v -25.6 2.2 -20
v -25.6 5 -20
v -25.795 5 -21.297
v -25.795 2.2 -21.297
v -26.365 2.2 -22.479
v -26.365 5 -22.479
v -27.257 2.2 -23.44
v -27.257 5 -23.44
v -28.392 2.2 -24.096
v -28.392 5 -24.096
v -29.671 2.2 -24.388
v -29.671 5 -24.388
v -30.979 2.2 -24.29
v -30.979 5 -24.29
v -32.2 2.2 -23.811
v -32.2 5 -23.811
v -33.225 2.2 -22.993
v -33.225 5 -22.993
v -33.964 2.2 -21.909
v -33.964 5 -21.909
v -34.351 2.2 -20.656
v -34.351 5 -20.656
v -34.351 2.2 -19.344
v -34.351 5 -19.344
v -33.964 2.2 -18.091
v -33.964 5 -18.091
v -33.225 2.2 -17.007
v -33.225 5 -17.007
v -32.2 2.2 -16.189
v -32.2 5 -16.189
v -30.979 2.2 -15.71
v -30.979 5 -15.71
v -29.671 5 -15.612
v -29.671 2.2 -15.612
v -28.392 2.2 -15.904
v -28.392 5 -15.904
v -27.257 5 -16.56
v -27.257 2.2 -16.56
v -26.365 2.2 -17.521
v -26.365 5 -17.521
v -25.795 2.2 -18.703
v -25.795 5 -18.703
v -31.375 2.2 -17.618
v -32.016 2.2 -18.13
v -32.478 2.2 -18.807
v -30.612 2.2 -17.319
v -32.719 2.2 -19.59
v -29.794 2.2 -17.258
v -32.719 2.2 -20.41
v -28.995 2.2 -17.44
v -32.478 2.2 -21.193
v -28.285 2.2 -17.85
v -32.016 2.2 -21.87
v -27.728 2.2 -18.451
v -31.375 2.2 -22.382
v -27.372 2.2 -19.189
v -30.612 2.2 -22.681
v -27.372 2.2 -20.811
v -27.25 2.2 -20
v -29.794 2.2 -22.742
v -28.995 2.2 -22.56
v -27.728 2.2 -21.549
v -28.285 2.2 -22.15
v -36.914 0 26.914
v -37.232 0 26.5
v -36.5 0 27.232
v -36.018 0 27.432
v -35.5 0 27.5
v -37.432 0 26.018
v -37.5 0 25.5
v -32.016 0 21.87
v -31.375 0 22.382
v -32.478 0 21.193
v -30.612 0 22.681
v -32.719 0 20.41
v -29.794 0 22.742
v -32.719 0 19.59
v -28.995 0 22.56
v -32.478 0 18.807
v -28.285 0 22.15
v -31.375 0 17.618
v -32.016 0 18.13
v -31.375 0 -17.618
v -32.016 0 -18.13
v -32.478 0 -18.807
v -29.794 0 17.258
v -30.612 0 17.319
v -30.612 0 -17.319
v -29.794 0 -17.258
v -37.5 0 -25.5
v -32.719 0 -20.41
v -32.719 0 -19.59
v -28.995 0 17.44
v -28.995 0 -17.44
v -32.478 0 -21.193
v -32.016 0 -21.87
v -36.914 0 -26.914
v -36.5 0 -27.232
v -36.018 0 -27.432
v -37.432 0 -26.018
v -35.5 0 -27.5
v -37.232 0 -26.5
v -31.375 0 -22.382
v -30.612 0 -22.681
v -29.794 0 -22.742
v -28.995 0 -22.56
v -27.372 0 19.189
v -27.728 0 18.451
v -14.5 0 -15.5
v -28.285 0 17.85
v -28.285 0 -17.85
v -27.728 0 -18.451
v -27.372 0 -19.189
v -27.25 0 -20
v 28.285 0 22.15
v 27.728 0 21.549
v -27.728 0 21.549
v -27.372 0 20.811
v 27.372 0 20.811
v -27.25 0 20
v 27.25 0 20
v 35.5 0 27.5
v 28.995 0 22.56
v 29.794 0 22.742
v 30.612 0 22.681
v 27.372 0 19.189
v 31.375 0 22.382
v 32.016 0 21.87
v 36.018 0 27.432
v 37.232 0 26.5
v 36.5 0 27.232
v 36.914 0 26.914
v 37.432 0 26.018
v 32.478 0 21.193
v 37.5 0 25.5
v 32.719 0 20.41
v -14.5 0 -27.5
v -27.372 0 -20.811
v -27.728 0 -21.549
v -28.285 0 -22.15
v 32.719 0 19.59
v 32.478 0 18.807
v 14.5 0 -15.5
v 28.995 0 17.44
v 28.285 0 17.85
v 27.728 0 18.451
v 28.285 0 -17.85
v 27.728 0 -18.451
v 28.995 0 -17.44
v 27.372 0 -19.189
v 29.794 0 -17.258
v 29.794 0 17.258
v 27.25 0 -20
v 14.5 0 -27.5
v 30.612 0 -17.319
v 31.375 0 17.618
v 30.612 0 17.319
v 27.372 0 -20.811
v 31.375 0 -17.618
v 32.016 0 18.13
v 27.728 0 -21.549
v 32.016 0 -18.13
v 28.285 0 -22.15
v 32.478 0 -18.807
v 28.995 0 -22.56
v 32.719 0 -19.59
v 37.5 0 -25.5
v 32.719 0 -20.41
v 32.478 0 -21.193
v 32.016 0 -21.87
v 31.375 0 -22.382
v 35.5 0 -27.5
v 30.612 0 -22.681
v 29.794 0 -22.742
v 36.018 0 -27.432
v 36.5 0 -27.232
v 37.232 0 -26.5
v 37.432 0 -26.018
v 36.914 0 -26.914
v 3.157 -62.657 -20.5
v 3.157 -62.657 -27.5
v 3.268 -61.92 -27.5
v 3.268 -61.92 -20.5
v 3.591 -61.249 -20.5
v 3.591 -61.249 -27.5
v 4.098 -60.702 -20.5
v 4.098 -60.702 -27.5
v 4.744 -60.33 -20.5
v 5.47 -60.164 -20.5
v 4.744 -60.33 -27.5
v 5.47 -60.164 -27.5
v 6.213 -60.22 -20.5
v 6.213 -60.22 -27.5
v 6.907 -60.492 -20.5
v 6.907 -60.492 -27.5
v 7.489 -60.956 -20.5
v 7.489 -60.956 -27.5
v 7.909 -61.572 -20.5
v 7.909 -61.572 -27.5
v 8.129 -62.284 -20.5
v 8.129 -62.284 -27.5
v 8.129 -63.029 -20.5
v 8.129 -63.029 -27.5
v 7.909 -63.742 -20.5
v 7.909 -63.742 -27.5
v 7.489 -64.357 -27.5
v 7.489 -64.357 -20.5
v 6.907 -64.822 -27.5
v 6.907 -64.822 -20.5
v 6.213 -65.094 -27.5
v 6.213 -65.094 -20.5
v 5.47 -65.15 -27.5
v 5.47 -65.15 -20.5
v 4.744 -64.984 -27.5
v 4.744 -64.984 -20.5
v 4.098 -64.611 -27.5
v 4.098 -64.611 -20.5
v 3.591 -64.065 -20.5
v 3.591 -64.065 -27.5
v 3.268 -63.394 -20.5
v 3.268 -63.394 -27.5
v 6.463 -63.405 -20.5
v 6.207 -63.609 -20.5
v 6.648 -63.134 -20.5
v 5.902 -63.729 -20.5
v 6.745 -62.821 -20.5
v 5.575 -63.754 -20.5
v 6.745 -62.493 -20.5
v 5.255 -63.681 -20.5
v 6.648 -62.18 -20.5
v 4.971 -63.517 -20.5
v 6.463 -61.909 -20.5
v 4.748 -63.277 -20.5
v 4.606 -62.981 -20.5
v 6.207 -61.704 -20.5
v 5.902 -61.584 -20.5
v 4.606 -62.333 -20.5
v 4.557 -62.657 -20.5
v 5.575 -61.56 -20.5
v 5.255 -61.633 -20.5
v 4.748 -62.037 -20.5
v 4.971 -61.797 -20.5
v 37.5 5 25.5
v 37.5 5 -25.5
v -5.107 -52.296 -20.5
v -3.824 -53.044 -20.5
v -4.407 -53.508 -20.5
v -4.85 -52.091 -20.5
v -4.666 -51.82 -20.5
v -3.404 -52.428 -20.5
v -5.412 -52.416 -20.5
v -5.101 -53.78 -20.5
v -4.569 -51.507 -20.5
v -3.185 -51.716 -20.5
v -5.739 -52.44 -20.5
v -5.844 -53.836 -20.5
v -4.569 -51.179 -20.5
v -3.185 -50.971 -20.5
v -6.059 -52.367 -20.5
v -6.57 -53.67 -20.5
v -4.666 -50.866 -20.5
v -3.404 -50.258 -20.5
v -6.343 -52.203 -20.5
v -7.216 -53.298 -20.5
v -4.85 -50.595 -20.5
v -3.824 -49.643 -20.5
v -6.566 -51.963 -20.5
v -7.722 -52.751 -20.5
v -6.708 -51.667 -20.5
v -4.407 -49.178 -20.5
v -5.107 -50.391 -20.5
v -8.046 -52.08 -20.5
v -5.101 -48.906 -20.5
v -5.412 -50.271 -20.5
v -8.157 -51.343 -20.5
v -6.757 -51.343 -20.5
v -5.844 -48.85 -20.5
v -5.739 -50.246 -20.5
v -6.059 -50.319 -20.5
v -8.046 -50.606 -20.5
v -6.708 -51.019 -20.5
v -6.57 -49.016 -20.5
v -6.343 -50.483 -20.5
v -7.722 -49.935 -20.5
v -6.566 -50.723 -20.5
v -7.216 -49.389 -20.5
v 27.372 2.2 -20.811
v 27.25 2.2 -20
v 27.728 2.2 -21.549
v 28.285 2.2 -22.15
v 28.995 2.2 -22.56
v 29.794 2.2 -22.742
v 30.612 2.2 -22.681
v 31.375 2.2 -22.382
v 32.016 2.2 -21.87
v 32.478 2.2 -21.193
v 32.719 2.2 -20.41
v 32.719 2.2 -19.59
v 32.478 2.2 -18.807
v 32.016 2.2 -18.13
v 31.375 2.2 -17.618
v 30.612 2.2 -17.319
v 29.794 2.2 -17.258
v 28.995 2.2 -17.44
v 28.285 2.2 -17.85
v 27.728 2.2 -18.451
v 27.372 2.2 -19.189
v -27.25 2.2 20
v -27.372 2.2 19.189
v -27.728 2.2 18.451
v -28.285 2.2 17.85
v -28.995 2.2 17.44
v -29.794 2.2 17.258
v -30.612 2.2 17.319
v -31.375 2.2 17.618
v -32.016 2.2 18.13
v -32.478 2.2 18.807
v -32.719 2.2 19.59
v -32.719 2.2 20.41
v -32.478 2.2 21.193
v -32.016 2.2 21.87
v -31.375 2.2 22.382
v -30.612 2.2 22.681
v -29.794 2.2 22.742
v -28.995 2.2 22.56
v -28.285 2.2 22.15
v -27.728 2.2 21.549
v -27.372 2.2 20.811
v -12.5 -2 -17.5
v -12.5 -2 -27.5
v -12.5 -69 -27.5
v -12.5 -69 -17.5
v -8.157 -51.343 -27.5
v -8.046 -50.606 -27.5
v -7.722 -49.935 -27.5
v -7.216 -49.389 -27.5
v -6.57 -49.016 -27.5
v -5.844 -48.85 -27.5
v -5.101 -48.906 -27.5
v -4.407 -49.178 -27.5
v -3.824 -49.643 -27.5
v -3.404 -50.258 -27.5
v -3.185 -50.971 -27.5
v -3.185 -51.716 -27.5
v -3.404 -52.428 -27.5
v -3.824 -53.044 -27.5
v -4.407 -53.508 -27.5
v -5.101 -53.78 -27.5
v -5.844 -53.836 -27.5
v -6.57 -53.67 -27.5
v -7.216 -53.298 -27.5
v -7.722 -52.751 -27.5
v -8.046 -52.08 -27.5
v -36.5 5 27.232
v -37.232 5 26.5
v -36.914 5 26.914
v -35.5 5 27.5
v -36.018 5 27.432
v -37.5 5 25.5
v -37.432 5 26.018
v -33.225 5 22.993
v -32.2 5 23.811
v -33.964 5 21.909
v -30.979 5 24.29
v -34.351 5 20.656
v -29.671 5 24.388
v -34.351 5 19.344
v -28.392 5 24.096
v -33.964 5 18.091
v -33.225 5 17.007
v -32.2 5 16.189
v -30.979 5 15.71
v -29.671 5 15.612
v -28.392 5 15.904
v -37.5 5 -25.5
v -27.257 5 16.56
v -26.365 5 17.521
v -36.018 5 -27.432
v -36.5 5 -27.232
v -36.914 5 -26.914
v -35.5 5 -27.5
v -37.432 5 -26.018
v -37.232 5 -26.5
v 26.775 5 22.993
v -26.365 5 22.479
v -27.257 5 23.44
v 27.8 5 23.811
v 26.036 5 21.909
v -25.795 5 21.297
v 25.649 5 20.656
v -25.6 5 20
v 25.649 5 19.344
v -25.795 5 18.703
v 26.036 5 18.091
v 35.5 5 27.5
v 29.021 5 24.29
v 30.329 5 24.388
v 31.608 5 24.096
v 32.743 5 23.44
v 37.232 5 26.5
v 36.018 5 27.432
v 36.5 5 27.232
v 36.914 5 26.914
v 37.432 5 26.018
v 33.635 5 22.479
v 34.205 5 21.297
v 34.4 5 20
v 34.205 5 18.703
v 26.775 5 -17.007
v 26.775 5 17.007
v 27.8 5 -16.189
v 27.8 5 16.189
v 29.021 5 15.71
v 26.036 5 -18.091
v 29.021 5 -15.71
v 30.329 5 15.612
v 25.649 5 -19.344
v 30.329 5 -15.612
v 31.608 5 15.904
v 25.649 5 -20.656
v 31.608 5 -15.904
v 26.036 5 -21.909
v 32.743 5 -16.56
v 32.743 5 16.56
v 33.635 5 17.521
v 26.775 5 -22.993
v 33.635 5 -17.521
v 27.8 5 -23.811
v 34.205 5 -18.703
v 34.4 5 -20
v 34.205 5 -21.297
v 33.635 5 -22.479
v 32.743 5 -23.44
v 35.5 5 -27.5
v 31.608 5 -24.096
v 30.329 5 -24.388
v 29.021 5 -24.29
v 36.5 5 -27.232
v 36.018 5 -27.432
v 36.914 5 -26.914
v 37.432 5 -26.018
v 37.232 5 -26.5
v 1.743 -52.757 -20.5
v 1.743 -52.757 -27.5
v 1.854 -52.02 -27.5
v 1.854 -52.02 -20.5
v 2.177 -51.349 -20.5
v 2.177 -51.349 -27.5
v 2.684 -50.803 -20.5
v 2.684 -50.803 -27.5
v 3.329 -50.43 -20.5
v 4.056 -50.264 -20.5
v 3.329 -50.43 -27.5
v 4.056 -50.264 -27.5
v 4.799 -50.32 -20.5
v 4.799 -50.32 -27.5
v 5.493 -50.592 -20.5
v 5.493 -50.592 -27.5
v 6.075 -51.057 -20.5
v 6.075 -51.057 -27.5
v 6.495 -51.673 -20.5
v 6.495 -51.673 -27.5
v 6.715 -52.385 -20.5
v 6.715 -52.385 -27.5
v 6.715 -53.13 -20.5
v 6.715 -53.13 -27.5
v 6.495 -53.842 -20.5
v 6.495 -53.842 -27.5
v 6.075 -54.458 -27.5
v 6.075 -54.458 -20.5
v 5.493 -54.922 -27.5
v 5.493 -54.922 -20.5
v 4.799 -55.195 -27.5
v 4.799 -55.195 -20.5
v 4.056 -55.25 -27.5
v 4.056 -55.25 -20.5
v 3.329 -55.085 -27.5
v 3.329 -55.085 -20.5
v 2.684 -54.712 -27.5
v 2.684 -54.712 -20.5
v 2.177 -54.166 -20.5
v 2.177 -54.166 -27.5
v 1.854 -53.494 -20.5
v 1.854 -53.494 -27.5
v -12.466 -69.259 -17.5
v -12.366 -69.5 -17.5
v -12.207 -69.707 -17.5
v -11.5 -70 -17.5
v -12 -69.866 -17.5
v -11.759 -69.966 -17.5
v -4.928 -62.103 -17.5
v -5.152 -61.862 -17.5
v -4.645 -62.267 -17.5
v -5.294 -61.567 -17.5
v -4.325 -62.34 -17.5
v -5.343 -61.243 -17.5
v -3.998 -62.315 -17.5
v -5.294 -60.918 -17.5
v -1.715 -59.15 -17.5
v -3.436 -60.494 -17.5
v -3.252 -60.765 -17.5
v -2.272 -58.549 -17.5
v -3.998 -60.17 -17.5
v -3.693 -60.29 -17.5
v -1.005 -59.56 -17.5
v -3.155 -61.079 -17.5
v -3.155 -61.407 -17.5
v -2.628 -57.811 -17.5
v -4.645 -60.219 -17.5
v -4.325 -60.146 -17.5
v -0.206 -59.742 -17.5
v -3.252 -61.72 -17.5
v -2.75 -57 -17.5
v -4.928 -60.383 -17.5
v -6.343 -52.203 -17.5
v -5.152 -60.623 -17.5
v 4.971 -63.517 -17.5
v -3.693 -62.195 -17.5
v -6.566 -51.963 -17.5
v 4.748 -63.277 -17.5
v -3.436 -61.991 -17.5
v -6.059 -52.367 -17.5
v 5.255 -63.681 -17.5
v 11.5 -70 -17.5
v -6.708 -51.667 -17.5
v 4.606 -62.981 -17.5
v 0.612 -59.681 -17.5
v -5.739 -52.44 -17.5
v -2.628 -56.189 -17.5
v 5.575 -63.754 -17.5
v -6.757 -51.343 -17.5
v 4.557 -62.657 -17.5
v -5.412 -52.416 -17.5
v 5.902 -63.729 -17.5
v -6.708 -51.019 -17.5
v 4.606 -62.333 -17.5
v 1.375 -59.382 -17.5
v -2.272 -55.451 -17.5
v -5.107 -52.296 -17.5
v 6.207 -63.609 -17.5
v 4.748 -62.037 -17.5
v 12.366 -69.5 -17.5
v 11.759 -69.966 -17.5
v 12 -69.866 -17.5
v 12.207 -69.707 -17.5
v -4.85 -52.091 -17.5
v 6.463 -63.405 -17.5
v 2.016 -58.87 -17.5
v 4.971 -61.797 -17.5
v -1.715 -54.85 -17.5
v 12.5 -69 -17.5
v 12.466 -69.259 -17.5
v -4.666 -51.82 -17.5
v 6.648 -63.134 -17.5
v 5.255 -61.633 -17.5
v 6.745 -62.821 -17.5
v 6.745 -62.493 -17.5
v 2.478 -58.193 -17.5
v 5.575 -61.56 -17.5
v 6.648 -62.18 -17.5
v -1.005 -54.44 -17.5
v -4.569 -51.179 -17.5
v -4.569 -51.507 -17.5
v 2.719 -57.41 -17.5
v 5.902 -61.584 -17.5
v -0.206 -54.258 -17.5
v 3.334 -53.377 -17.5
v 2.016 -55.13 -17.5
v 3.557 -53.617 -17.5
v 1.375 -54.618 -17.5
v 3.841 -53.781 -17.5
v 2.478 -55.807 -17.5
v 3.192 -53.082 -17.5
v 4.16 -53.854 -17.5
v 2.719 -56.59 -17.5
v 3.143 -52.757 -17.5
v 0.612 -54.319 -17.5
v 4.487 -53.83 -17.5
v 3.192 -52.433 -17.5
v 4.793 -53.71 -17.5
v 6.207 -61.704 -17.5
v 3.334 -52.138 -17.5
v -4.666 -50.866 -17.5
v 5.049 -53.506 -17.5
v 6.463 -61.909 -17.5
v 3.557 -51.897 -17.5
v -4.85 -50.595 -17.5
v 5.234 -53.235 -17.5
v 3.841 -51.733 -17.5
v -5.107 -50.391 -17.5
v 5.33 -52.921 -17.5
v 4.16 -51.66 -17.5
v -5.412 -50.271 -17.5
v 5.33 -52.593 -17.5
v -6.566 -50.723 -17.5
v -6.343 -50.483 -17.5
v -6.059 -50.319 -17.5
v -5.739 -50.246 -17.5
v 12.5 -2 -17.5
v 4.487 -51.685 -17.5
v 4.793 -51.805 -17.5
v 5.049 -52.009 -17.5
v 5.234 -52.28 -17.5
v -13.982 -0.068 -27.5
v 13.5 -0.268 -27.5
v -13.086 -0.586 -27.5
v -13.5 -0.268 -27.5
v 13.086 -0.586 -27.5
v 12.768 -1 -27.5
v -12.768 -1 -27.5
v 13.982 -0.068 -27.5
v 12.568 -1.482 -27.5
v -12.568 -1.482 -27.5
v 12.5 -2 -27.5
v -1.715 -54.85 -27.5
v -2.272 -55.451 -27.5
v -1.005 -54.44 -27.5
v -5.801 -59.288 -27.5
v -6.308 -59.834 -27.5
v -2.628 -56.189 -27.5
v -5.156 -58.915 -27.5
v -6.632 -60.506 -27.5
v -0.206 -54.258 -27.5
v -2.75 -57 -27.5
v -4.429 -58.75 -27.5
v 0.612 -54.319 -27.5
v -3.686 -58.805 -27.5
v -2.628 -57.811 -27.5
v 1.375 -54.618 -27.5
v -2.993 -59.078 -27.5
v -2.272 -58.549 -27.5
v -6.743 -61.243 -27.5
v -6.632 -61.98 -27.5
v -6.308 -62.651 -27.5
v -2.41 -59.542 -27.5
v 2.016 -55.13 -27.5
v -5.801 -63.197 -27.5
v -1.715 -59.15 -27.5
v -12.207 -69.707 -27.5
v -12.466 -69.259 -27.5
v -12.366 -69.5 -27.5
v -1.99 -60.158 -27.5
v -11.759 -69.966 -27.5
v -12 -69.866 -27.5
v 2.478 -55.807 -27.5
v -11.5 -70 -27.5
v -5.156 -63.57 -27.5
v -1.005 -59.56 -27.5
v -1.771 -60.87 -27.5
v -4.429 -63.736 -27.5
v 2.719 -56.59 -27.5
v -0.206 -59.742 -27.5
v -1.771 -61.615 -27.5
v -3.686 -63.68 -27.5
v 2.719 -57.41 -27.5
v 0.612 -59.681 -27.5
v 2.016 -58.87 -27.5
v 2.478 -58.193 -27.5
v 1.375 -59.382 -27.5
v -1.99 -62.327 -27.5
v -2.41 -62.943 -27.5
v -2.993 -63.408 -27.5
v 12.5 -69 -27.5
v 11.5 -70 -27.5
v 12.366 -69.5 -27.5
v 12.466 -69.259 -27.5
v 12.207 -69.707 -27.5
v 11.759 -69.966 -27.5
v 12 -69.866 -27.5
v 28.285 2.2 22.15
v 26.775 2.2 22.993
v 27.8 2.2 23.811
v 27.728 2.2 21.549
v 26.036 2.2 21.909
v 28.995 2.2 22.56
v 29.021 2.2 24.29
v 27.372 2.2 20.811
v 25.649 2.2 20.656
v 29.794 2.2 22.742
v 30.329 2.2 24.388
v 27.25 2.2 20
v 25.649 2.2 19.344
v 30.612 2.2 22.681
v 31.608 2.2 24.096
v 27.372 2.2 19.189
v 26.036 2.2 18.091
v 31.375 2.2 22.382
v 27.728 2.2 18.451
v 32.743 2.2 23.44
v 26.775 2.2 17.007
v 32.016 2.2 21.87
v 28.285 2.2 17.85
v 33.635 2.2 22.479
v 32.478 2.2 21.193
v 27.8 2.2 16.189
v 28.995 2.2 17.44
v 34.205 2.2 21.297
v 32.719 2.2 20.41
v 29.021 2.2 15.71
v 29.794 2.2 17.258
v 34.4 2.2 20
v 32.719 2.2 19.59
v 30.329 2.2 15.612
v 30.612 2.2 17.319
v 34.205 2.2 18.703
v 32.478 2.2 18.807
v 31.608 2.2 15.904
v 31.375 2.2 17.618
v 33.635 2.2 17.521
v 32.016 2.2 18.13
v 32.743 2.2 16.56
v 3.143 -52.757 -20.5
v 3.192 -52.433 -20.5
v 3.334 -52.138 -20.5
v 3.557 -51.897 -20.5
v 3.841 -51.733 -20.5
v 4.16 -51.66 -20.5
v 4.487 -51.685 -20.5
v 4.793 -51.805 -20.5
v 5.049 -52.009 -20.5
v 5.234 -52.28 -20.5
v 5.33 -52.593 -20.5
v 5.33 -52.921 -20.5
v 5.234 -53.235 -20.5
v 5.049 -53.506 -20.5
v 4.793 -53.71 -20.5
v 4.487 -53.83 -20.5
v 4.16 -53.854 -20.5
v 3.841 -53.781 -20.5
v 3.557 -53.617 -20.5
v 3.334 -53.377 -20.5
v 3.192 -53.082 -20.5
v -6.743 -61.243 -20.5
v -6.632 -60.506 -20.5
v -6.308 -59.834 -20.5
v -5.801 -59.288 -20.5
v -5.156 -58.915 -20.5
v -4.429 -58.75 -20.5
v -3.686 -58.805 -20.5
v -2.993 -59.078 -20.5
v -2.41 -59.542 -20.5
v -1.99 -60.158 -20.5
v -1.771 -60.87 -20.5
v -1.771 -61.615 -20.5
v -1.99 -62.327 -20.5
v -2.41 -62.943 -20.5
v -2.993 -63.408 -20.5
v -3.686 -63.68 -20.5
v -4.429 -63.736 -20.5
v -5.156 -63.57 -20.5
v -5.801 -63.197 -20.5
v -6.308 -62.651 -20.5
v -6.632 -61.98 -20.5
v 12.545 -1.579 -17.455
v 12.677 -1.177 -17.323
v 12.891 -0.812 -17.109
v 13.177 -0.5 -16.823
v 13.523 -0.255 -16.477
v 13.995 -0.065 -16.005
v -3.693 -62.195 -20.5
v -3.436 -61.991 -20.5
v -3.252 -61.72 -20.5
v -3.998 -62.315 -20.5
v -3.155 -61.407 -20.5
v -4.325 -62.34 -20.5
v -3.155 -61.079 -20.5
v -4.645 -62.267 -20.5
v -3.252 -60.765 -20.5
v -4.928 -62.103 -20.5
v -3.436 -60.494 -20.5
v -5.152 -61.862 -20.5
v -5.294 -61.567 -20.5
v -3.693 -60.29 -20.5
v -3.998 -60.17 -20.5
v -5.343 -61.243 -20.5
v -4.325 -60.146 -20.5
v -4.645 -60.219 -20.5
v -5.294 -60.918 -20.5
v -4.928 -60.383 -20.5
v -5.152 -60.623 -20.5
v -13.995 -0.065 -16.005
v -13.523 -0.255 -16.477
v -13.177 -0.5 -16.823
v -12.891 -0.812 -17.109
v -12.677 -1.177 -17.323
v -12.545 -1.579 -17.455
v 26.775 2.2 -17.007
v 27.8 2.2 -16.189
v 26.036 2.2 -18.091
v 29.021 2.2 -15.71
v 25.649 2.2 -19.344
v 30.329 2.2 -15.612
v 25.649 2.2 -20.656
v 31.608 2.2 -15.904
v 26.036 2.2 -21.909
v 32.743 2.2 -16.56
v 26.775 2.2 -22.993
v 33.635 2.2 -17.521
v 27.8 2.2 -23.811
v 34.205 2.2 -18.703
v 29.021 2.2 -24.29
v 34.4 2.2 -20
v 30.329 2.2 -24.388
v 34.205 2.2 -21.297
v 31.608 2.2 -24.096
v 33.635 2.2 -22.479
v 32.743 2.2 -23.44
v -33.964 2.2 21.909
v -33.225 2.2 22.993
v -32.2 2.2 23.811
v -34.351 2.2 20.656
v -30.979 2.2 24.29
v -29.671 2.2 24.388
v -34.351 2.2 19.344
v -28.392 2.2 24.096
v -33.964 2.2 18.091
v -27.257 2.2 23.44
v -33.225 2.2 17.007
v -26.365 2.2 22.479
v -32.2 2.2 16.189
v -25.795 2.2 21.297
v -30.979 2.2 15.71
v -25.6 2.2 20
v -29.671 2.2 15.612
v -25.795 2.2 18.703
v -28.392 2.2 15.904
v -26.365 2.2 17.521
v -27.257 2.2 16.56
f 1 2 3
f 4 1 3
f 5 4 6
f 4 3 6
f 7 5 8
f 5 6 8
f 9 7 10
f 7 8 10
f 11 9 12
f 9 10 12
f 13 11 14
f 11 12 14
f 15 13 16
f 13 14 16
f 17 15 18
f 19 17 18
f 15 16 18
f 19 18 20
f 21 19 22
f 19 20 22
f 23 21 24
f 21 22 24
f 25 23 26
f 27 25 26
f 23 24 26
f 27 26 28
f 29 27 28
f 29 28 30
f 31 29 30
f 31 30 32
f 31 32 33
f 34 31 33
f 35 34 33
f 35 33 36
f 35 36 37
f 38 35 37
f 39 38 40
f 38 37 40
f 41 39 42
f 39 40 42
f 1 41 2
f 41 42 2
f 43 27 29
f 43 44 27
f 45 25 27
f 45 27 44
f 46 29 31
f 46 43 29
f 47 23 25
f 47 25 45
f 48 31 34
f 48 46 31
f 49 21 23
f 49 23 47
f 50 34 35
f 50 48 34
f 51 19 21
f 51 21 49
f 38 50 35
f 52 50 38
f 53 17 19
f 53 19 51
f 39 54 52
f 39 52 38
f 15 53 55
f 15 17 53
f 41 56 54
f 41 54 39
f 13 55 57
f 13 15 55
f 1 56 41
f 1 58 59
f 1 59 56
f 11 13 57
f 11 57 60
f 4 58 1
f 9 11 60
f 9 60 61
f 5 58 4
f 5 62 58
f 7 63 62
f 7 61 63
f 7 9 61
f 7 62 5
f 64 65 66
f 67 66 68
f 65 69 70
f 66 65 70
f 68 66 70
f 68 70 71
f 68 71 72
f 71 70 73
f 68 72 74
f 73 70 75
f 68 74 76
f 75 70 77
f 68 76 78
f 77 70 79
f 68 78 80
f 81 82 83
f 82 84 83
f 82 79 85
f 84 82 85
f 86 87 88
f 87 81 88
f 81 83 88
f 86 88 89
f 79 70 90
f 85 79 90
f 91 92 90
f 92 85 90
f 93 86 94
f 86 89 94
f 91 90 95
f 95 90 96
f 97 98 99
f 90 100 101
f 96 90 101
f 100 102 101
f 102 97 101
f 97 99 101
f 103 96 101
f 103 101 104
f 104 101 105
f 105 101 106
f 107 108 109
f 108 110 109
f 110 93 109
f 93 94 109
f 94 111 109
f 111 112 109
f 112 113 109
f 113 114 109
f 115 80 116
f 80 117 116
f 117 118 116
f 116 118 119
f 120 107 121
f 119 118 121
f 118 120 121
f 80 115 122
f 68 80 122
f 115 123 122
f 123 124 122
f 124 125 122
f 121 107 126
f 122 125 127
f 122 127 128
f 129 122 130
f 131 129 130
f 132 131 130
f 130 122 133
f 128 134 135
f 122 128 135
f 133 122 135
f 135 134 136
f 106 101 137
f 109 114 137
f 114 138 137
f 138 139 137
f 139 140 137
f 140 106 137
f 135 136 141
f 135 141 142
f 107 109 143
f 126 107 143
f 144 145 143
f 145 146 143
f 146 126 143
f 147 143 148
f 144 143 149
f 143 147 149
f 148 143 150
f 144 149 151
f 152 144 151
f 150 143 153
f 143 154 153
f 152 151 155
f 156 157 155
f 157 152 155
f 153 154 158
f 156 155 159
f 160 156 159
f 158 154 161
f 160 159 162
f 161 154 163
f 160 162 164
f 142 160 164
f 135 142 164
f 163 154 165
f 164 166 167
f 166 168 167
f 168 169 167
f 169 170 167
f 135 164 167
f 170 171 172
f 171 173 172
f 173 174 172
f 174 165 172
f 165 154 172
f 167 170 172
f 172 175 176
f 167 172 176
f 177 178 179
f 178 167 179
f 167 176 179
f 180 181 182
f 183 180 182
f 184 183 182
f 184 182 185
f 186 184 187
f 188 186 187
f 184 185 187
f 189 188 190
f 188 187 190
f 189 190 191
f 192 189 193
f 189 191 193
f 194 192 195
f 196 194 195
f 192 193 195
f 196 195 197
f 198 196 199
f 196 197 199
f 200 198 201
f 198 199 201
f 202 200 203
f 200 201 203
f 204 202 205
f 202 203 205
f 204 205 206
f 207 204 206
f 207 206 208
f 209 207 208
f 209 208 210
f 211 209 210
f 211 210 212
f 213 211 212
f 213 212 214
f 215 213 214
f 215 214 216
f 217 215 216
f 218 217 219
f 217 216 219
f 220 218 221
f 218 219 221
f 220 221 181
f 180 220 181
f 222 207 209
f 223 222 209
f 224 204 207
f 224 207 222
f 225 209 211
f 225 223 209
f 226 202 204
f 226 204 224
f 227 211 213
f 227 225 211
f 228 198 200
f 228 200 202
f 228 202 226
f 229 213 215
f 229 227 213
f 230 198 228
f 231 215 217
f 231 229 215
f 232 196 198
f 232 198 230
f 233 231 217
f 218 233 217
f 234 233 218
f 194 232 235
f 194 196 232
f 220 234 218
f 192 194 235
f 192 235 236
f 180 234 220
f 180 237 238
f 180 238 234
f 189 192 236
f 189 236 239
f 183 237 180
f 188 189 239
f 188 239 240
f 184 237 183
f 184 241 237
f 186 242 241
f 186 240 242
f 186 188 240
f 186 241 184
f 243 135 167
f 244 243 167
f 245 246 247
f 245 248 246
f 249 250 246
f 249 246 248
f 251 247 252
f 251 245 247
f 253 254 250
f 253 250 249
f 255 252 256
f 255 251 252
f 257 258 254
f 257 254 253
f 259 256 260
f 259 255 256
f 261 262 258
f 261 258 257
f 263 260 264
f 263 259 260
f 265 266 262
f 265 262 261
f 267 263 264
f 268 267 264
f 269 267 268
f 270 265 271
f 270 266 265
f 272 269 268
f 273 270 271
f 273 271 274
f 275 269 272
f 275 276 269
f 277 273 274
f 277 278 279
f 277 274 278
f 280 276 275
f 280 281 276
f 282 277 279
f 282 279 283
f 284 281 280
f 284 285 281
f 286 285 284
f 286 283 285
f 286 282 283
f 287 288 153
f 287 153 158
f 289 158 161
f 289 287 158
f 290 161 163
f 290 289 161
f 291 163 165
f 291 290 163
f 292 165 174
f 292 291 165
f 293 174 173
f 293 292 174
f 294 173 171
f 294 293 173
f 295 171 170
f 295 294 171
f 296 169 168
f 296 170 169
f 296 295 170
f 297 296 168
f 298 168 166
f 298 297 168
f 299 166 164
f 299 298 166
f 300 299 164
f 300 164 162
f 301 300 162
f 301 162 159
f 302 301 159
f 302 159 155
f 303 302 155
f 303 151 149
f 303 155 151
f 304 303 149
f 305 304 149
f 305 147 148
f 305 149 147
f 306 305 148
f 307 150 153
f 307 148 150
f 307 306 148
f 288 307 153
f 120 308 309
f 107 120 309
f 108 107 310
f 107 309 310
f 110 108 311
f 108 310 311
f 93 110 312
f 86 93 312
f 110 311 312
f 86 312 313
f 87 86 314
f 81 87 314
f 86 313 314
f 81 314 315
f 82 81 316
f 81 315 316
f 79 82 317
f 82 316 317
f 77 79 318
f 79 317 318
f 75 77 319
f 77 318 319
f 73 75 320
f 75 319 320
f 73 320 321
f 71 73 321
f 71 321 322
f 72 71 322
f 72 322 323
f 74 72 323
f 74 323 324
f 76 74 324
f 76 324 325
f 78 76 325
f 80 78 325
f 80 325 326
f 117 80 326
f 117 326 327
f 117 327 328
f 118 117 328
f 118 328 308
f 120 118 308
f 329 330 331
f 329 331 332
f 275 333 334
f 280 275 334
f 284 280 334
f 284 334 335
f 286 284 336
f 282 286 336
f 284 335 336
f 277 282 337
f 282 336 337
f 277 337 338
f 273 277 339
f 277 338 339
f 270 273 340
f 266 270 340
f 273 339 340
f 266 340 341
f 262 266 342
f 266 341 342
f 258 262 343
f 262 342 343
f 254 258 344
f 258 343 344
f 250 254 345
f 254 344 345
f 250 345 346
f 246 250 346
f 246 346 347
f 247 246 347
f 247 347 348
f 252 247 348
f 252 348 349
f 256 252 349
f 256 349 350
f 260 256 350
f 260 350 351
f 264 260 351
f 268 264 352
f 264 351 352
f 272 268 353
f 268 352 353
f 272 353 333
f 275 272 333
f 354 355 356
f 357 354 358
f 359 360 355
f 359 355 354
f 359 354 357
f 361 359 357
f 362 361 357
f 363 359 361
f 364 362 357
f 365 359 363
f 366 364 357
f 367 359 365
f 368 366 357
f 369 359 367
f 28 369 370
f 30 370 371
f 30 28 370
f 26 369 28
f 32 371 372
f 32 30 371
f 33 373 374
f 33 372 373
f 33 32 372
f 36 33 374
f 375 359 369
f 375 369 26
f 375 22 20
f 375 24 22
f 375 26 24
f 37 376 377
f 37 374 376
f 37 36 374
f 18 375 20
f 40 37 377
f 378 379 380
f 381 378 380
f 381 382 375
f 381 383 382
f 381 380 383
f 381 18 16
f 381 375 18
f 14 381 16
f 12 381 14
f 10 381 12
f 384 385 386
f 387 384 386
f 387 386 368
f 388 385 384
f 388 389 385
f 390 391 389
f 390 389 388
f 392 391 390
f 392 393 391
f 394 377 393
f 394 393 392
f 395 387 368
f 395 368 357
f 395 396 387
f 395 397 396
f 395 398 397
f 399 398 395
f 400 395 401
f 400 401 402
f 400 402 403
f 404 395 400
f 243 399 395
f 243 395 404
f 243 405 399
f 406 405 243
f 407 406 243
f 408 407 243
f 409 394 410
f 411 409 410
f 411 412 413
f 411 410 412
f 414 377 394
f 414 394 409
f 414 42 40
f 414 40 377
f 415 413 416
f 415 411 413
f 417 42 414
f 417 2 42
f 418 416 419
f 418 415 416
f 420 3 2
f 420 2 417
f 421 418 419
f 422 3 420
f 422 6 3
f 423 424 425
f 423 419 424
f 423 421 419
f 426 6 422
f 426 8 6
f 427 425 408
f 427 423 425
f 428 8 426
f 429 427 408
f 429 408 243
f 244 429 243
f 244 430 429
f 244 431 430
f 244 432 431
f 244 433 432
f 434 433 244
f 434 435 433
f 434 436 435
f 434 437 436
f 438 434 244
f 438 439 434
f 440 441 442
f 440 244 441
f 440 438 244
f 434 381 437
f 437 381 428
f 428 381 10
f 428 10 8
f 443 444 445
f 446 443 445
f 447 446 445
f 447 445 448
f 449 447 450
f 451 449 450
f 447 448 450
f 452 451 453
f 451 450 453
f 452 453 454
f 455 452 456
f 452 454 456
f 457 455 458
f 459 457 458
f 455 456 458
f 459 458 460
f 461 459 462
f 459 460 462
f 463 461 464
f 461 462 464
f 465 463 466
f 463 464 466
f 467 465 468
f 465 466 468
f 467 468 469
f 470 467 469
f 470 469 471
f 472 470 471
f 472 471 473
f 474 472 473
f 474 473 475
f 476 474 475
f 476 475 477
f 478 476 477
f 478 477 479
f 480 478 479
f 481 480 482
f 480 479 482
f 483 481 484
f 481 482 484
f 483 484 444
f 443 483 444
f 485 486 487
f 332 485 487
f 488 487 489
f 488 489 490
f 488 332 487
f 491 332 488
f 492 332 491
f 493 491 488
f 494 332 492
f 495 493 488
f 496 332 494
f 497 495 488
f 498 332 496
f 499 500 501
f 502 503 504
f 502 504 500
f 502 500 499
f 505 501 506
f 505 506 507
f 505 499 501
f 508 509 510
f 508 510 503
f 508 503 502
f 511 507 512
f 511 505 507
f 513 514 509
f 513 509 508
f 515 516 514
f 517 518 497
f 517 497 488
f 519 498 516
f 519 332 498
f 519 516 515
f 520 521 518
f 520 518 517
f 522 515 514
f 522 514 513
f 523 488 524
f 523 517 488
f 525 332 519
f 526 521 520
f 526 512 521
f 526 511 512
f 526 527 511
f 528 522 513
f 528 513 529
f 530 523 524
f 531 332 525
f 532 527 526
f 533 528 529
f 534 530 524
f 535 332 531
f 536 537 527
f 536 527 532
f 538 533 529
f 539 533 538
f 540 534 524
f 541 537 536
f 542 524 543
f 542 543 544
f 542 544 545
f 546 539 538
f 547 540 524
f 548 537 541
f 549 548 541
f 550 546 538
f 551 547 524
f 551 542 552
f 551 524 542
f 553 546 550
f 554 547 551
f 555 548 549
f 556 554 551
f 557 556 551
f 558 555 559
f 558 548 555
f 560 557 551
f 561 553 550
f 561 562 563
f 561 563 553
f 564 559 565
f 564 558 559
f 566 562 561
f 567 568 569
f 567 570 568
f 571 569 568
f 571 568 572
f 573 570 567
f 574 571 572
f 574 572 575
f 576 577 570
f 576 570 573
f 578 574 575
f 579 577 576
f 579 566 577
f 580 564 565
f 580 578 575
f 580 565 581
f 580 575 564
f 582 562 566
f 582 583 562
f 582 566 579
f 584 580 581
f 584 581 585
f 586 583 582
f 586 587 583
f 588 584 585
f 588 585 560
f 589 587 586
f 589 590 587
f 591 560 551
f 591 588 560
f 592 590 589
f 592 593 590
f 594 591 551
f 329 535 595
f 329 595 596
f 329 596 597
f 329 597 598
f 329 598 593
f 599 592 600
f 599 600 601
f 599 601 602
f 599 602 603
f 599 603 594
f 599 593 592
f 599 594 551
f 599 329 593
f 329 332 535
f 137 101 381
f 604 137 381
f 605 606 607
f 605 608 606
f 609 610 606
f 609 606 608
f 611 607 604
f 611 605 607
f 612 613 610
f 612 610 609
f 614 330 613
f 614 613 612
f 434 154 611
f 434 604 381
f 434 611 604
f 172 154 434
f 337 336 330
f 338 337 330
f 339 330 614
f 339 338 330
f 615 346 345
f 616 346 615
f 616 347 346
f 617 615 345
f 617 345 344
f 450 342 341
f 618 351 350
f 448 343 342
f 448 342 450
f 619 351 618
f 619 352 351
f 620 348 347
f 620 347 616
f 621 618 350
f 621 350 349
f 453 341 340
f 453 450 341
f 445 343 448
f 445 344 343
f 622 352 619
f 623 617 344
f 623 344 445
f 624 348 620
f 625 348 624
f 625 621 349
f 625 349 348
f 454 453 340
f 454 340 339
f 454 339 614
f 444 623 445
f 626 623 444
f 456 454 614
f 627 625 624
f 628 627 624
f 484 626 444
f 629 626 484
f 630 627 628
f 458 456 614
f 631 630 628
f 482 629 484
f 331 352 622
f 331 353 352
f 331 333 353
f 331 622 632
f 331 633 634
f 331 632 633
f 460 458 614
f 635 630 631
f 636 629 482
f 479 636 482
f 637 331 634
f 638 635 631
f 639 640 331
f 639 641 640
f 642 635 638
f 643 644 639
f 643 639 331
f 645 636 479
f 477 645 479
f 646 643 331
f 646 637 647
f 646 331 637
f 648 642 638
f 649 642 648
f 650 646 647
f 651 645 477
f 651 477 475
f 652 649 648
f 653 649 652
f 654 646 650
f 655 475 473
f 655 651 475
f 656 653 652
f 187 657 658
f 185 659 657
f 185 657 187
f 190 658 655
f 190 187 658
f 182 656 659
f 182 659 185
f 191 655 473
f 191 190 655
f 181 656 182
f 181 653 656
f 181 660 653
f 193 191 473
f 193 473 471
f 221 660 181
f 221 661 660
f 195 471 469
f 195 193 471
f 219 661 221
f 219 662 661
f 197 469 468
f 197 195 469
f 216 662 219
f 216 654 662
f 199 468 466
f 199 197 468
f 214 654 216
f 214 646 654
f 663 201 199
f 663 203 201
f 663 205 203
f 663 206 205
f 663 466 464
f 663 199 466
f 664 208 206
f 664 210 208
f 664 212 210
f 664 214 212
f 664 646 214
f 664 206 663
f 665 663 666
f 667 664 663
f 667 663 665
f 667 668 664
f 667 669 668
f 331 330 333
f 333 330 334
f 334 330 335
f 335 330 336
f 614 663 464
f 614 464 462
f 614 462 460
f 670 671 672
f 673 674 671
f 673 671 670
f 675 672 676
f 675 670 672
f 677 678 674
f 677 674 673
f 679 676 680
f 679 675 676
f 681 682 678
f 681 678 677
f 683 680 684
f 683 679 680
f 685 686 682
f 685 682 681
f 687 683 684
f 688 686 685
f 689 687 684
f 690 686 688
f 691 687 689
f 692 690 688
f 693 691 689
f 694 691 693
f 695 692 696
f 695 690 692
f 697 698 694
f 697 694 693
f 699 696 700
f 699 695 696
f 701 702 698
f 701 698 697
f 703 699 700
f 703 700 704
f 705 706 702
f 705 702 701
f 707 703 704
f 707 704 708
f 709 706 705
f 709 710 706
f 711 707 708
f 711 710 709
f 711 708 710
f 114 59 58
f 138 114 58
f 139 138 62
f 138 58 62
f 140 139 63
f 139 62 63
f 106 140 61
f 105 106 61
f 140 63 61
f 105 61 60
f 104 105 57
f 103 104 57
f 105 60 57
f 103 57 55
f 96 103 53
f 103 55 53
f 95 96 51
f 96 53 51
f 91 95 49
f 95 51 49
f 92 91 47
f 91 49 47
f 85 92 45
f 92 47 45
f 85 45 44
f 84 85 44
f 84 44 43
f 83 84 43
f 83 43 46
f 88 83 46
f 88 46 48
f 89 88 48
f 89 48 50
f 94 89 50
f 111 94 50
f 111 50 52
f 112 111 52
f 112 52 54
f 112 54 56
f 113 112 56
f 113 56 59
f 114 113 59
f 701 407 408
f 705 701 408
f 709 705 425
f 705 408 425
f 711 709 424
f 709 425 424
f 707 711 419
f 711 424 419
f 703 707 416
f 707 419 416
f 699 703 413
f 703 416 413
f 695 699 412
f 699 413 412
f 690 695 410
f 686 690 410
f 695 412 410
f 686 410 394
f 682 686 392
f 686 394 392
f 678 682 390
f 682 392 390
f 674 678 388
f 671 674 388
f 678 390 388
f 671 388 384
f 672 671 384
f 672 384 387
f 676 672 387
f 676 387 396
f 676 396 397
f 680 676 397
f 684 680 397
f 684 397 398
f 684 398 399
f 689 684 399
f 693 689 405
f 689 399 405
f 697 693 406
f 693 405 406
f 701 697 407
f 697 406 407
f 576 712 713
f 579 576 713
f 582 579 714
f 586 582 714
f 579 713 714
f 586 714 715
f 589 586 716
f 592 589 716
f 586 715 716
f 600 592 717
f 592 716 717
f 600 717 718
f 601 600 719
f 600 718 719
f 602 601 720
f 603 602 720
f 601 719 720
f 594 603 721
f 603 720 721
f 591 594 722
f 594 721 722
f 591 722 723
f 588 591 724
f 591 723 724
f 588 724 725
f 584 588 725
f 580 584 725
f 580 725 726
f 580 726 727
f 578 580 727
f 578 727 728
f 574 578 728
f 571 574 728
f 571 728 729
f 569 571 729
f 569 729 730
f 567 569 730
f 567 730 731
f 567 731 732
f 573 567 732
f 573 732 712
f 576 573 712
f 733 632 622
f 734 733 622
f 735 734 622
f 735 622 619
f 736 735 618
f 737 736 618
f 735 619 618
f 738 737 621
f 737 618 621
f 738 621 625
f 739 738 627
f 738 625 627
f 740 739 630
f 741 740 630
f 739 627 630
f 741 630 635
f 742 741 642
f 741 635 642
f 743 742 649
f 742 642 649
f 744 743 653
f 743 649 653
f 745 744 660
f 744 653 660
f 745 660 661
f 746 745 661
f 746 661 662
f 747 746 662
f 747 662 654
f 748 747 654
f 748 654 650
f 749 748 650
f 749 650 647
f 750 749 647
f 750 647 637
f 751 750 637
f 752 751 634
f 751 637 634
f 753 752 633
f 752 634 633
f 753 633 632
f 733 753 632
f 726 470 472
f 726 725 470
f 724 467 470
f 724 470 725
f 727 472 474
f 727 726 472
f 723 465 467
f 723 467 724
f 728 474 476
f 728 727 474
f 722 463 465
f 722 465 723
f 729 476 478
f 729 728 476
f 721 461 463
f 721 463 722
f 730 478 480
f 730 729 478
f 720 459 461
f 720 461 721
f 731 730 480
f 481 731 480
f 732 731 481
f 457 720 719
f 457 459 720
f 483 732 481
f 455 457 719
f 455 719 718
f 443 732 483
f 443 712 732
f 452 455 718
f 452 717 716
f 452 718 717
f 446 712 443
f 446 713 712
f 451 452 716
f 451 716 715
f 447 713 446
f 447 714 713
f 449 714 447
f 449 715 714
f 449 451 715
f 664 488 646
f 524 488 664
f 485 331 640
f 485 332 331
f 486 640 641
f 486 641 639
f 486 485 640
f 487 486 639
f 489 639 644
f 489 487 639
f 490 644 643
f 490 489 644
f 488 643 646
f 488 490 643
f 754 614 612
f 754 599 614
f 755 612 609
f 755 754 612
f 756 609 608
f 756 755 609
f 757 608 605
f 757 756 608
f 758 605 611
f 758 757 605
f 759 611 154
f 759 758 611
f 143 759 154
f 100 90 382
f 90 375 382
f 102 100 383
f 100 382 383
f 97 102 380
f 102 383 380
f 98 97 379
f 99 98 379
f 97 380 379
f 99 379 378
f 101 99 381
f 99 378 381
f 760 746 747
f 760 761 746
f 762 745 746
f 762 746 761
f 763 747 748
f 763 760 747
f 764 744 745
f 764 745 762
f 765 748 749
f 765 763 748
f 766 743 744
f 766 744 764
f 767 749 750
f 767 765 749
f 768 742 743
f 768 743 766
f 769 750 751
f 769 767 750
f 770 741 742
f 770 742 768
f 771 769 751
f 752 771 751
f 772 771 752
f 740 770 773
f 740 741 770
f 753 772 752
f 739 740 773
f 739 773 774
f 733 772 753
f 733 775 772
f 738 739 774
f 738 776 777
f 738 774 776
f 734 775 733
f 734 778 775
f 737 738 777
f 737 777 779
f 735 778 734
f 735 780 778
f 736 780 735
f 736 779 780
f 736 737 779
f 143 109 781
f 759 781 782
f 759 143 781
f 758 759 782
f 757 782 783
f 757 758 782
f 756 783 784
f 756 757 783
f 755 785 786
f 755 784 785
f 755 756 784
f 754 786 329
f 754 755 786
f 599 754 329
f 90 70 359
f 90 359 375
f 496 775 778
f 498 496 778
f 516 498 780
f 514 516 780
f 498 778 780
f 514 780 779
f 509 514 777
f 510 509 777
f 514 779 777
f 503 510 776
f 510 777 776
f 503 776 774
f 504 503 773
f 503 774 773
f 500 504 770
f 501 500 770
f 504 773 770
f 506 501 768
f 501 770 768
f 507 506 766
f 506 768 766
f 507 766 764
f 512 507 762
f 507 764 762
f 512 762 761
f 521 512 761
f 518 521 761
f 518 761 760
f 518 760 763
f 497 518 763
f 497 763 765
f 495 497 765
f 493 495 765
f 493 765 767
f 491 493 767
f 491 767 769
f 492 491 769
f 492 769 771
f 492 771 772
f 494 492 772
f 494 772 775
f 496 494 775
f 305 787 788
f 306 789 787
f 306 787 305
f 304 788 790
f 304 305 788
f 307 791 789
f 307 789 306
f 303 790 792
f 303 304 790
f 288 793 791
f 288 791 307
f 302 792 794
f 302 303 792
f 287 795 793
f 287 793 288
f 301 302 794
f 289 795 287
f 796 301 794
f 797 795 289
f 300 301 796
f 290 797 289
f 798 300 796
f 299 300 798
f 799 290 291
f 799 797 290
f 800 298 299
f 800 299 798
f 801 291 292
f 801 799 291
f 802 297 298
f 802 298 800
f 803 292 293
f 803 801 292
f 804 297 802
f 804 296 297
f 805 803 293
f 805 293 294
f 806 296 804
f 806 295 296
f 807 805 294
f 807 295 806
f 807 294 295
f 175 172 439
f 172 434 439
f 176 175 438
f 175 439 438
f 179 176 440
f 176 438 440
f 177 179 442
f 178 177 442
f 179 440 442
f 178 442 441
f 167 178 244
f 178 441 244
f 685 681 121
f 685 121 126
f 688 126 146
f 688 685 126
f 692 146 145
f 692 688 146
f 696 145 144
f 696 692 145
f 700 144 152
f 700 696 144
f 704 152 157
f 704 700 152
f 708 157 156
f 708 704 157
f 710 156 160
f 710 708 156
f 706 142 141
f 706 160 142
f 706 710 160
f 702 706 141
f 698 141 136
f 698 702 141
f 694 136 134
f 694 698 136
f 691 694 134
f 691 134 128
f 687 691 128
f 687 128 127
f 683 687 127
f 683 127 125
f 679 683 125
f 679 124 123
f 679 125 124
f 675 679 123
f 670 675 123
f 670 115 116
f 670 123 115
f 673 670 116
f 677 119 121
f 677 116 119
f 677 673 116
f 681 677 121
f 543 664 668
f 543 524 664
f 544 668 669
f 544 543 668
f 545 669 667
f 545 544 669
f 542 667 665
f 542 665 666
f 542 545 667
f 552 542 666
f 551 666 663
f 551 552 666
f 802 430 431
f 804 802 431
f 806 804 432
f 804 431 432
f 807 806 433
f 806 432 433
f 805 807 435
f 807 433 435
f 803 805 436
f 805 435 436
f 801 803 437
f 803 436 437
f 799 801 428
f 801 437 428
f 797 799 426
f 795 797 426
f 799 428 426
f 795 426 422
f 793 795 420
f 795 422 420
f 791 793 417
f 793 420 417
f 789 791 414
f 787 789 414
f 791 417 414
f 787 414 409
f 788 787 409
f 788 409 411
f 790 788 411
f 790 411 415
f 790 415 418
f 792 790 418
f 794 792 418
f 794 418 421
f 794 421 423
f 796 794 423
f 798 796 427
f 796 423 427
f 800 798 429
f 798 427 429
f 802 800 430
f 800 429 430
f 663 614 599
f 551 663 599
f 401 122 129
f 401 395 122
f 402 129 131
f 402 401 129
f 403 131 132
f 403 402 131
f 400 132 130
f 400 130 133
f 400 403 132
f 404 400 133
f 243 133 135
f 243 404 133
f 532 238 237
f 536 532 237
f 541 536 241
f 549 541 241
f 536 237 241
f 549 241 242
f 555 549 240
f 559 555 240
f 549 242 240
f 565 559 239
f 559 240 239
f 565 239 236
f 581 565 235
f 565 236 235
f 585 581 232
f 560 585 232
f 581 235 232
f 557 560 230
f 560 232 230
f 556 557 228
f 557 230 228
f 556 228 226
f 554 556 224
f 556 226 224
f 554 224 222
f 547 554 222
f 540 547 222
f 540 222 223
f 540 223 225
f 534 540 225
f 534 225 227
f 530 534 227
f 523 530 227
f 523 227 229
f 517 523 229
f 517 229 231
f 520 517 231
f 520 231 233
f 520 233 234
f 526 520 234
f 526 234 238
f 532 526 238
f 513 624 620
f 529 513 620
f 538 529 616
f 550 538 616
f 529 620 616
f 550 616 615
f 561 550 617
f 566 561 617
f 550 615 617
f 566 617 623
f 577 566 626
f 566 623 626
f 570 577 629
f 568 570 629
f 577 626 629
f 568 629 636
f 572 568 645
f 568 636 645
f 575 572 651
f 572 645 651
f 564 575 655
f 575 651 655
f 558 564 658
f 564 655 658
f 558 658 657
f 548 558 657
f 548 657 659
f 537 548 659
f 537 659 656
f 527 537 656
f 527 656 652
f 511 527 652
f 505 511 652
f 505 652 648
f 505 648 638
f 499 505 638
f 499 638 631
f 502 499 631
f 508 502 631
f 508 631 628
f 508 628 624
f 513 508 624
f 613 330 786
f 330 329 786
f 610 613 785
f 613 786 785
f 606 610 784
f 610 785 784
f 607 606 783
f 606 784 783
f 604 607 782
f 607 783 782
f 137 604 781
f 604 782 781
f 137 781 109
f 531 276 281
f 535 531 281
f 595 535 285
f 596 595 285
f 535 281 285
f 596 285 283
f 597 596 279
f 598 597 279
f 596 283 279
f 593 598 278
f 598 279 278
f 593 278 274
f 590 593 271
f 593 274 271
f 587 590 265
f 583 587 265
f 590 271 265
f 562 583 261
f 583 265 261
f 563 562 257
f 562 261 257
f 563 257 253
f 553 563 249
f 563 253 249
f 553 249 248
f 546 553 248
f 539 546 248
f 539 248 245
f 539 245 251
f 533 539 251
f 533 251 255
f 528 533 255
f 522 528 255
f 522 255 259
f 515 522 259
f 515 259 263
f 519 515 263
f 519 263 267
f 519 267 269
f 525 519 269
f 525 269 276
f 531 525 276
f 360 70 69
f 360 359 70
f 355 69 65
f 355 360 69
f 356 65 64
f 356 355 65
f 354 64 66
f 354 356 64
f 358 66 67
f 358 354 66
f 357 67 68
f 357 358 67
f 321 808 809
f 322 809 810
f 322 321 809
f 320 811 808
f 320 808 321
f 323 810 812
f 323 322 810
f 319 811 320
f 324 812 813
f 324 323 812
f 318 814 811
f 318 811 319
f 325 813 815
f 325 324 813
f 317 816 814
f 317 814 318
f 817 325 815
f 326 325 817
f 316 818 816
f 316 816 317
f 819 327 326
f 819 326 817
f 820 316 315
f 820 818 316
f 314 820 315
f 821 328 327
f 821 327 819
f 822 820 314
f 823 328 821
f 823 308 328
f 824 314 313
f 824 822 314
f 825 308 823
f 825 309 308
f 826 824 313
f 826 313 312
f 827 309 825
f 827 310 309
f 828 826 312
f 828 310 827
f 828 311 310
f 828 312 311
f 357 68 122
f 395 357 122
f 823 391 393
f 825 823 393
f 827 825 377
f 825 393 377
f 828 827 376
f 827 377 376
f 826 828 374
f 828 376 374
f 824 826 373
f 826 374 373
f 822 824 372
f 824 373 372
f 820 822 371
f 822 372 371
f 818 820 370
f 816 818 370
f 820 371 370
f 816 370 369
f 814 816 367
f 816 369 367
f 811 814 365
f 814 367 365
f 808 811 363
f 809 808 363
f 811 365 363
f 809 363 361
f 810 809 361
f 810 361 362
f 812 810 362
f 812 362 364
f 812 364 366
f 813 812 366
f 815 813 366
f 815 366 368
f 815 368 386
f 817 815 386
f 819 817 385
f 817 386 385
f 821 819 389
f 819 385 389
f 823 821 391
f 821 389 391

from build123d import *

# Parameters (mm, degrees)
SKETCH1_W           = 75
SKETCH1_H           = 55
BOSS_EXTRUDE1_DEPTH = 5
SKETCH2_R           = 2.75
CUT_EXTRUDE1_DEPTH  = 6
FILLET5_R           = 2
SKETCH6_R           = 4.4
CUT_EXTRUDE3_DEPTH  = 2.8
SKETCH7_W           = 25
SKETCH7_H           = 10
BOSS_EXTRUDE2_DEPTH = 70
SKETCH8_W           = 7
SKETCH8_H           = 30
CUT_EXTRUDE4_DEPTH  = 51
SKETCH11_W          = 25
SKETCH11_H          = 7
BOSS_EXTRUDE3_DEPTH = 30
FILLET6_R           = 2
FILLET7_R           = 1
SKETCH17_R          = 2.75
SKETCH17_R_2        = 1.1
CUT_EXTRUDE5_DEPTH  = 56
SKETCH18_R          = 2.5
CUT_EXTRUDE6_DEPTH  = 7


with BuildPart() as part:
    # Sketch1 → Boss-Extrude1 (new body)
    with BuildSketch(Plane(origin=(0, 0, 0), x_dir=(1, 0, 0), z_dir=(0, 1, 0))):
        Rectangle(SKETCH1_W, SKETCH1_H)
    extrude(amount=BOSS_EXTRUDE1_DEPTH)

    # Sketch2 → Cut-Extrude1 (cut, through all)
    with BuildSketch(Plane(origin=(0, 5, 0), x_dir=(1, 0, 0), z_dir=(0, 1, 0))):
        with Locations((-30, 20)):
            Circle(SKETCH2_R)
        with Locations((-30, -20)):
            Circle(SKETCH2_R)
    cut_extrude1 = extrude(amount=-CUT_EXTRUDE1_DEPTH, mode=Mode.SUBTRACT)

    # Mirror1: Cut-Extrude1 across plane
    add(cut_extrude1.mirror(Plane(origin=(0, 0, 0), x_dir=(0, 0, 1), z_dir=(1, 0, 0))), mode=Mode.SUBTRACT)

    # Fillet5
    fillet5_edges = [part.edges().sort_by_distance(p)[0] for p in [
        (37.5, 2.5, 27.5),
        (-37.5, 2.5, 27.5),
        (-37.5, 2.5, -27.5),
        (37.5, 2.5, -27.5),
    ]]
    fillet(fillet5_edges, radius=FILLET5_R)

    # Sketch6 → Cut-Extrude3 (cut)
    with BuildSketch(Plane(origin=(0, 5, 0), x_dir=(1, 0, 0), z_dir=(0, 1, 0))):
        with Locations((-30, 20)):
            Circle(SKETCH6_R)
        with Locations((-30, -20)):
            Circle(SKETCH6_R)
        with Locations((30, 20)):
            Circle(SKETCH6_R)
        with Locations((30, -20)):
            Circle(SKETCH6_R)
    extrude(amount=-CUT_EXTRUDE3_DEPTH, mode=Mode.SUBTRACT)

    # Sketch7 → Boss-Extrude2 (add)
    with BuildSketch(Plane.XZ):
        with Locations((0, -22.5)):
            Rectangle(SKETCH7_W, SKETCH7_H)
    extrude(amount=BOSS_EXTRUDE2_DEPTH)

    # Sketch8 → Cut-Extrude4 (cut, through all)
    with BuildSketch(Plane.ZY.offset(12.5)):
        with Locations((-21, -55)):
            Rectangle(SKETCH8_W, SKETCH8_H)
    extrude(amount=-CUT_EXTRUDE4_DEPTH, mode=Mode.SUBTRACT)

    # Sketch11 → Boss-Extrude3 (add)
    with BuildSketch(Plane.XZ.offset(40)):
        with Locations((0, -21)):
            Rectangle(SKETCH11_W, SKETCH11_H)
    extrude(amount=BOSS_EXTRUDE3_DEPTH)

    # Fillet6
    fillet6_edges = [part.edges().sort_by_distance(p)[0] for p in [
        (-12.5, 0, -22.5),
        (12.5, 0, -22.5),
        (0, 0, -17.5),
    ]]
    fillet(fillet6_edges, radius=FILLET6_R)

    # Fillet7
    fillet7_edges = [part.edges().sort_by_distance(p)[0] for p in [
        (12.5, -70, -22.5),
        (-12.5, -70, -22.5),
    ]]
    fillet(fillet7_edges, radius=FILLET7_R)

    # Sketch17 → Cut-Extrude5 (cut, through all)
    with BuildSketch(Plane(origin=(0, 0, -27.5), x_dir=(-1, 0, 0), z_dir=(0, 0, -1))):
        with Locations((0, -57)):
            Circle(SKETCH17_R)
        with Locations((5.656854249, -51.343145751)):
            Circle(SKETCH17_R_2)
        with Locations((-5.656854249, -62.656854249)):
            Circle(SKETCH17_R_2)
        with Locations((-4.242640687, -52.757359313)):
            Circle(SKETCH17_R_2)
        with Locations((4.242640687, -61.242640687)):
            Circle(SKETCH17_R_2)
    extrude(amount=-CUT_EXTRUDE5_DEPTH, mode=Mode.SUBTRACT)

    # Sketch18 → Cut-Extrude6 (cut)
    with BuildSketch(Plane(origin=(0, 0, -27.5), x_dir=(-1, 0, 0), z_dir=(0, 0, -1))):
        with Locations((-4.242640687, -52.757359313)):
            Circle(SKETCH18_R)
        with Locations((-5.656854249, -62.656854249)):
            Circle(SKETCH18_R)
        with Locations((5.656854249, -51.343145751)):
            Circle(SKETCH18_R)
        with Locations((4.242640687, -61.242640687)):
            Circle(SKETCH18_R)
    extrude(amount=-CUT_EXTRUDE6_DEPTH, mode=Mode.SUBTRACT)


solid = part.part
